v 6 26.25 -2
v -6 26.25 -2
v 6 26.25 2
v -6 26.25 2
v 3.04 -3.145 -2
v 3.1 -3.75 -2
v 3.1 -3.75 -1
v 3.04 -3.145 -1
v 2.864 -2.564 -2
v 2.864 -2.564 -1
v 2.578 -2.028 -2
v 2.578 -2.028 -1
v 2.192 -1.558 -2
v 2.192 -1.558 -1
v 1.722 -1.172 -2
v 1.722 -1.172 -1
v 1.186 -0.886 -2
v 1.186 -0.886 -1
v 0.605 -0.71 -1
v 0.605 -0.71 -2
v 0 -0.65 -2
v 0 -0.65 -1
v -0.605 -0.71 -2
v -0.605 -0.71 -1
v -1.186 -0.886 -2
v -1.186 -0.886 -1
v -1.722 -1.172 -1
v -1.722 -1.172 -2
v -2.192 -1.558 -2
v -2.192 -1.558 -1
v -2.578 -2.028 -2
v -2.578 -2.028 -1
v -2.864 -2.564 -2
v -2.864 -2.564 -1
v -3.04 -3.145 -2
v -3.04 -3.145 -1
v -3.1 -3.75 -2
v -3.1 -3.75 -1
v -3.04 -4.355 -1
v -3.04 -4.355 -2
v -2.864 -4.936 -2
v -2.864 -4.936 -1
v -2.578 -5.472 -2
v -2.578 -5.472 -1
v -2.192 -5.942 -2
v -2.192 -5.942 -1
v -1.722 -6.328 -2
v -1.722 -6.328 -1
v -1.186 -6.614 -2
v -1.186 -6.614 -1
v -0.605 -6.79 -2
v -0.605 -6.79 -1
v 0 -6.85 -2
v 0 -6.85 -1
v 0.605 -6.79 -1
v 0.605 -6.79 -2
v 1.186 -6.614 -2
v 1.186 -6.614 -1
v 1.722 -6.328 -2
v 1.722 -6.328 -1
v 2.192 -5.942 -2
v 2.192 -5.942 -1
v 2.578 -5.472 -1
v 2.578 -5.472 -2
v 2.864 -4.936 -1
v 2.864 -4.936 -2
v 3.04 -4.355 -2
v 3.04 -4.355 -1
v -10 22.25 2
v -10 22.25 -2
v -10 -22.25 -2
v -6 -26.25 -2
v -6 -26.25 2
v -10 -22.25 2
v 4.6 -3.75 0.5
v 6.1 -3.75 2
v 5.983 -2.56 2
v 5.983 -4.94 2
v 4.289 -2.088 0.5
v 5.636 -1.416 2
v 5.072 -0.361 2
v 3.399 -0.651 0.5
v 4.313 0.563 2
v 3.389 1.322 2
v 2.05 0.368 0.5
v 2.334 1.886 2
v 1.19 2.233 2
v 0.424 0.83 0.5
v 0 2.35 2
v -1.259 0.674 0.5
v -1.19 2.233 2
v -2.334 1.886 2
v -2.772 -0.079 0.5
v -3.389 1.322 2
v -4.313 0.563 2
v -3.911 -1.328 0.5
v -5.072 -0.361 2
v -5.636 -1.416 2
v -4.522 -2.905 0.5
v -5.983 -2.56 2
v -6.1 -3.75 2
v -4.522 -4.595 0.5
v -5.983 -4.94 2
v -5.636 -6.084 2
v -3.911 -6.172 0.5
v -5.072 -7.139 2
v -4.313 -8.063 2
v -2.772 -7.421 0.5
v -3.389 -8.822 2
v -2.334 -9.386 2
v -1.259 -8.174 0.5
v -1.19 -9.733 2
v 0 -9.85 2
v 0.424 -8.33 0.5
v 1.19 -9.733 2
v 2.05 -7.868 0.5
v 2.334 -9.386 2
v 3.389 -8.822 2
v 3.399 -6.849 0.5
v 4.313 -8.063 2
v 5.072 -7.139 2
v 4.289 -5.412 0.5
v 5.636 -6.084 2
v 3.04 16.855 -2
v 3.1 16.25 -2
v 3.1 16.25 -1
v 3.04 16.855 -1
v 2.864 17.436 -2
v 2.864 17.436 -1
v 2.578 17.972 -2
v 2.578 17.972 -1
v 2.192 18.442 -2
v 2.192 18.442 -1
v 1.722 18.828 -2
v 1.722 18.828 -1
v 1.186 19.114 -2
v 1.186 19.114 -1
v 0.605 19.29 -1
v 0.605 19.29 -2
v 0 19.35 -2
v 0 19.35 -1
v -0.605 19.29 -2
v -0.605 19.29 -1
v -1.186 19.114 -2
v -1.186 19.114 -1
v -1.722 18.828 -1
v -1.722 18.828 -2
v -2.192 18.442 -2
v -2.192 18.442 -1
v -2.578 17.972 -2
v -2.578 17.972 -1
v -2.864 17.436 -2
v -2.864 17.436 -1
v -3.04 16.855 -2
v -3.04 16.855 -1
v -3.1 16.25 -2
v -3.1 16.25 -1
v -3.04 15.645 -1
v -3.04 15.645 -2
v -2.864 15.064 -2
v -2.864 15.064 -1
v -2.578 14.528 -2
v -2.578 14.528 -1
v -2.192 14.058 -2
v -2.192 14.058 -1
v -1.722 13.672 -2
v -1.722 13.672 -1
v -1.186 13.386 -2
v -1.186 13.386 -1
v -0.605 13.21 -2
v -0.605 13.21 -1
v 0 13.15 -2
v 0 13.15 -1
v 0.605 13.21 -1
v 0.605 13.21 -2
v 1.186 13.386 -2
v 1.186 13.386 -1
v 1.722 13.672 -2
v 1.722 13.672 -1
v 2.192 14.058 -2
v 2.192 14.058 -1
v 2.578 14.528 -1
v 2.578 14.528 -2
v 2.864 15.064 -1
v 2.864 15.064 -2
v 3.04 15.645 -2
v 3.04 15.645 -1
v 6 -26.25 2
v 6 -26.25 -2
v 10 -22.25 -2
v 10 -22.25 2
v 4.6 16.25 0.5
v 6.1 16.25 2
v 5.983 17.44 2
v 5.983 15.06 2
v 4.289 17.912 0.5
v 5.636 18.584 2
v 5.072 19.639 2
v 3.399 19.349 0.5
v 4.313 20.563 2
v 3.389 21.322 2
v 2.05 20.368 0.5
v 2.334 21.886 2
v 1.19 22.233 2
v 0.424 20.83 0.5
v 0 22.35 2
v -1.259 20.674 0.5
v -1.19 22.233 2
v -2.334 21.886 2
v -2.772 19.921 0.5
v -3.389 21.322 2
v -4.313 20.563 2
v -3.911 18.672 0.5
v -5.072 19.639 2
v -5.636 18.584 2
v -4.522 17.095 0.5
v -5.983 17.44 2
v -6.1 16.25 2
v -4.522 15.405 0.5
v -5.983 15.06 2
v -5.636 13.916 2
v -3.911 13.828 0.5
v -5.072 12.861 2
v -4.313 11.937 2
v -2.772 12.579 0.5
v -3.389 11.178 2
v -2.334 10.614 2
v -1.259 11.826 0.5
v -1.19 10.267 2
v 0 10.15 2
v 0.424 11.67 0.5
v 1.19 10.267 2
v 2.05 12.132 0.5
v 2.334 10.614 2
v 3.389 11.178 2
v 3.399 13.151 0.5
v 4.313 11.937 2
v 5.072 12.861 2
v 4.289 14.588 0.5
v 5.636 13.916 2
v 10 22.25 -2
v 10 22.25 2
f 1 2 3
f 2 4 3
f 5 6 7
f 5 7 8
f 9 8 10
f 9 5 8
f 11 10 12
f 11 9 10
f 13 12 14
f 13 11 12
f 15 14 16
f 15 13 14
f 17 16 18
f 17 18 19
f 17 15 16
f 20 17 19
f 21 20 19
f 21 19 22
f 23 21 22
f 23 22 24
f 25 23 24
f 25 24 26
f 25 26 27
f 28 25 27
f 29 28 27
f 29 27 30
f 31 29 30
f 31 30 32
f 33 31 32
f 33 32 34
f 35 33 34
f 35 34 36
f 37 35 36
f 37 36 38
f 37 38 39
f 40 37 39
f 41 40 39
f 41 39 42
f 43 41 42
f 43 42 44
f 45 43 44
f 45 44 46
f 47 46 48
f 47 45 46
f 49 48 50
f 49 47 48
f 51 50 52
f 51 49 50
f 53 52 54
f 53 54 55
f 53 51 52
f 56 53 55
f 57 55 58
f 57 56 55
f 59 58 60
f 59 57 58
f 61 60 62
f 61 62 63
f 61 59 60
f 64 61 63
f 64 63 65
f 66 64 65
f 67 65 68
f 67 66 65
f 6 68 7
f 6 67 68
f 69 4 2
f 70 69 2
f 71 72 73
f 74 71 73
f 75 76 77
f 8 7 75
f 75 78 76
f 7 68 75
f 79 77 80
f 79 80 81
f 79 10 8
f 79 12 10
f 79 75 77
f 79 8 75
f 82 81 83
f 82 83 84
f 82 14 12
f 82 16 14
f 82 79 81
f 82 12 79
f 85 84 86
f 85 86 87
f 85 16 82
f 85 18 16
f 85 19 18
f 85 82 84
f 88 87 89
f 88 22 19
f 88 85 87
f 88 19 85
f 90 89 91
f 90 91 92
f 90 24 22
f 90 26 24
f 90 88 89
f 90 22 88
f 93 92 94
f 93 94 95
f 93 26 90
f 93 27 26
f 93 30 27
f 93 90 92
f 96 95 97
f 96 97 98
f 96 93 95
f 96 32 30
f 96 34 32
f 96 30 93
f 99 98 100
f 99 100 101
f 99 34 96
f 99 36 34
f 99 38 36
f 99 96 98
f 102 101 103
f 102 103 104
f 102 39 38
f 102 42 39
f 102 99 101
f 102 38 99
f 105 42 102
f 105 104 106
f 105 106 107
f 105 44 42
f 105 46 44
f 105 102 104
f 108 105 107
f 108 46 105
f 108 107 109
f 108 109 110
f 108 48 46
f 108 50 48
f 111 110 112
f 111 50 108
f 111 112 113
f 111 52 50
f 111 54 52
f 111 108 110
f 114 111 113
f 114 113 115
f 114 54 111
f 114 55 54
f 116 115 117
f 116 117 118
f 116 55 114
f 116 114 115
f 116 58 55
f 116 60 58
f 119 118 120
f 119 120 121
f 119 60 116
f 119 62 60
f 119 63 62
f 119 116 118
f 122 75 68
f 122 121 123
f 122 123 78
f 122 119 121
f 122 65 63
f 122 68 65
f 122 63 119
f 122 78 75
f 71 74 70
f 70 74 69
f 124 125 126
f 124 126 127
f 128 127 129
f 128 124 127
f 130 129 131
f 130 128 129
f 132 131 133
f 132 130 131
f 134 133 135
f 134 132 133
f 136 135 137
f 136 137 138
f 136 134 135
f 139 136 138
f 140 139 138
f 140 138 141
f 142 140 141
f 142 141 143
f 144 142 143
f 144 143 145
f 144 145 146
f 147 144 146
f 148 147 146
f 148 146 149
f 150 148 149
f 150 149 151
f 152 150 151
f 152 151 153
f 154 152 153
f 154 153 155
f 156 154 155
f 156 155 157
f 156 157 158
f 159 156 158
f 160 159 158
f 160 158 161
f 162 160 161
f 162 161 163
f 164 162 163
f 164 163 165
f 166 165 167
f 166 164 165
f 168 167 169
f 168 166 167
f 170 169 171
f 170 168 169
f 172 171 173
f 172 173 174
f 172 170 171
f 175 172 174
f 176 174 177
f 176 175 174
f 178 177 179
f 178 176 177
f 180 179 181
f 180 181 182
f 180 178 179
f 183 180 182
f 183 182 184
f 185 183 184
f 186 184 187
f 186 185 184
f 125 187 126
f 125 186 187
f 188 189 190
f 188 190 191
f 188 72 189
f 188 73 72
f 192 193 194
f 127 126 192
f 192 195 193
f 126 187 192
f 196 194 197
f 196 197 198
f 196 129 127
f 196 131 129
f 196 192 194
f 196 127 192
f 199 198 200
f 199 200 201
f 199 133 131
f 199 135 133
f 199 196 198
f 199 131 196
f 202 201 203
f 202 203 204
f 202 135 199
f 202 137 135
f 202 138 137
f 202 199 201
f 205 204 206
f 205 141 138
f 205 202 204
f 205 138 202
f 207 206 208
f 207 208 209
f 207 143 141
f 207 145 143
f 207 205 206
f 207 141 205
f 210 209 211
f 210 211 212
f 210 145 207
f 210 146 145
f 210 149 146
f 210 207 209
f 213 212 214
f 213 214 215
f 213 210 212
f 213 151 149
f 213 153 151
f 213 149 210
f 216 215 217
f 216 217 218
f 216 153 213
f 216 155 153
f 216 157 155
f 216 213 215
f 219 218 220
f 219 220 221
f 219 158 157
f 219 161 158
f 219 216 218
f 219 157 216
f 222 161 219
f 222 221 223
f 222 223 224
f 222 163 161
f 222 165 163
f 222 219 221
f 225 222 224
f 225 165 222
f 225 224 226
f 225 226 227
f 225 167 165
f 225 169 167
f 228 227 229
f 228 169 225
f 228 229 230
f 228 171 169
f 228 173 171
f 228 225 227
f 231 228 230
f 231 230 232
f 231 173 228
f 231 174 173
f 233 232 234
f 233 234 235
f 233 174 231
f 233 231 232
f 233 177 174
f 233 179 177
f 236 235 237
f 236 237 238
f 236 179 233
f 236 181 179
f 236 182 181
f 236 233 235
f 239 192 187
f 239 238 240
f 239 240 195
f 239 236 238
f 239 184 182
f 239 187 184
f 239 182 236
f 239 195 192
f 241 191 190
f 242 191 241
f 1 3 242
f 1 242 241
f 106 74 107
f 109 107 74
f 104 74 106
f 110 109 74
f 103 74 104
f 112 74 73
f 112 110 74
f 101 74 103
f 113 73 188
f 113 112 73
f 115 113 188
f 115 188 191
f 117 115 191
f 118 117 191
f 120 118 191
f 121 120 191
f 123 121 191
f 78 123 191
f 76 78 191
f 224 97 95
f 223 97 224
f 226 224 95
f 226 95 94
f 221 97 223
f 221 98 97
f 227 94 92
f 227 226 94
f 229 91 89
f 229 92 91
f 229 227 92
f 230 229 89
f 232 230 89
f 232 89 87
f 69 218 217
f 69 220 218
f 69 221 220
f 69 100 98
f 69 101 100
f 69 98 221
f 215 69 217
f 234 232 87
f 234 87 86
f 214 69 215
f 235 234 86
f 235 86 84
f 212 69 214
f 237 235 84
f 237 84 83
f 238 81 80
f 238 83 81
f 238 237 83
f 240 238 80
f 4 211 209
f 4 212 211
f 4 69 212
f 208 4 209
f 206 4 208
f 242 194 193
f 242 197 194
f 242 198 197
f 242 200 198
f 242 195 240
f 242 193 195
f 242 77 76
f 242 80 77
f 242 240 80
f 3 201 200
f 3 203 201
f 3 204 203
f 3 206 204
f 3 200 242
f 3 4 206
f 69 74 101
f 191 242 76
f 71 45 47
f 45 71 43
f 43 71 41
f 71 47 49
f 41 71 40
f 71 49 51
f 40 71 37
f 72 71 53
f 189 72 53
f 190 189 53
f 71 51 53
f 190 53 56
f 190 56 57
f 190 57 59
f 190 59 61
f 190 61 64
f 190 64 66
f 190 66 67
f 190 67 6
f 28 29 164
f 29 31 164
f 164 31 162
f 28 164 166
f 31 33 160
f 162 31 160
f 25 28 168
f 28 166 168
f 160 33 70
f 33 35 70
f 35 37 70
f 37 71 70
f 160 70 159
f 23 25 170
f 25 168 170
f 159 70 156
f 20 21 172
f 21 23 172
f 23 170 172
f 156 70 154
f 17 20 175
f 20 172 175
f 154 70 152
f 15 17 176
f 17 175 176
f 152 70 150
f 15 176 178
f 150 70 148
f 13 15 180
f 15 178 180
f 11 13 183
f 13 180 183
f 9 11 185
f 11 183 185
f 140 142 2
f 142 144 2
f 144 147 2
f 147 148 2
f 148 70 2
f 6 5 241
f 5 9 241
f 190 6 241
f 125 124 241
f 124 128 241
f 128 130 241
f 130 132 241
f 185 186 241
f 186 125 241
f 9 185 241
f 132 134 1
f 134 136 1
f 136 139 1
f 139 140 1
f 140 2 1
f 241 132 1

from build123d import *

# Parameters (mm, degrees)
SKETCH_1_W      = 20
SKETCH_1_H      = 52.5
SKETCH_1_R      = 3.1
EXTRUDE_1_DEPTH = 2
CHAMFER_1_SIZE  = 4
CHAMFER_2_SIZE  = 3


with BuildPart() as part:
    # 草图1 → 凸台-拉伸1 (new, symmetric)
    with BuildSketch(Plane.XY):
        Rectangle(SKETCH_1_W, SKETCH_1_H)
        with Locations((0, 16.25)):
            Circle(SKETCH_1_R, mode=Mode.SUBTRACT)
        with Locations((0, -3.75)):
            Circle(SKETCH_1_R, mode=Mode.SUBTRACT)
    extrude(amount=EXTRUDE_1_DEPTH, both=True)

    # 倒角1
    chamfer_1_edges = [part.edges().sort_by_distance(p)[0] for p in [
        (-10, 26.25, 0),
        (10, 26.25, 0),
        (10, -26.25, 0),
        (-10, -26.25, 0),
    ]]
    chamfer(chamfer_1_edges, length=CHAMFER_1_SIZE)

    # 倒角2
    chamfer_2_edges = [part.edges().sort_by_distance(p)[0] for p in [
        (-3.1, 16.25, 2),
        (-3.1, -3.75, 2),
    ]]
    chamfer(chamfer_2_edges, length=CHAMFER_2_SIZE)


solid = part.part
